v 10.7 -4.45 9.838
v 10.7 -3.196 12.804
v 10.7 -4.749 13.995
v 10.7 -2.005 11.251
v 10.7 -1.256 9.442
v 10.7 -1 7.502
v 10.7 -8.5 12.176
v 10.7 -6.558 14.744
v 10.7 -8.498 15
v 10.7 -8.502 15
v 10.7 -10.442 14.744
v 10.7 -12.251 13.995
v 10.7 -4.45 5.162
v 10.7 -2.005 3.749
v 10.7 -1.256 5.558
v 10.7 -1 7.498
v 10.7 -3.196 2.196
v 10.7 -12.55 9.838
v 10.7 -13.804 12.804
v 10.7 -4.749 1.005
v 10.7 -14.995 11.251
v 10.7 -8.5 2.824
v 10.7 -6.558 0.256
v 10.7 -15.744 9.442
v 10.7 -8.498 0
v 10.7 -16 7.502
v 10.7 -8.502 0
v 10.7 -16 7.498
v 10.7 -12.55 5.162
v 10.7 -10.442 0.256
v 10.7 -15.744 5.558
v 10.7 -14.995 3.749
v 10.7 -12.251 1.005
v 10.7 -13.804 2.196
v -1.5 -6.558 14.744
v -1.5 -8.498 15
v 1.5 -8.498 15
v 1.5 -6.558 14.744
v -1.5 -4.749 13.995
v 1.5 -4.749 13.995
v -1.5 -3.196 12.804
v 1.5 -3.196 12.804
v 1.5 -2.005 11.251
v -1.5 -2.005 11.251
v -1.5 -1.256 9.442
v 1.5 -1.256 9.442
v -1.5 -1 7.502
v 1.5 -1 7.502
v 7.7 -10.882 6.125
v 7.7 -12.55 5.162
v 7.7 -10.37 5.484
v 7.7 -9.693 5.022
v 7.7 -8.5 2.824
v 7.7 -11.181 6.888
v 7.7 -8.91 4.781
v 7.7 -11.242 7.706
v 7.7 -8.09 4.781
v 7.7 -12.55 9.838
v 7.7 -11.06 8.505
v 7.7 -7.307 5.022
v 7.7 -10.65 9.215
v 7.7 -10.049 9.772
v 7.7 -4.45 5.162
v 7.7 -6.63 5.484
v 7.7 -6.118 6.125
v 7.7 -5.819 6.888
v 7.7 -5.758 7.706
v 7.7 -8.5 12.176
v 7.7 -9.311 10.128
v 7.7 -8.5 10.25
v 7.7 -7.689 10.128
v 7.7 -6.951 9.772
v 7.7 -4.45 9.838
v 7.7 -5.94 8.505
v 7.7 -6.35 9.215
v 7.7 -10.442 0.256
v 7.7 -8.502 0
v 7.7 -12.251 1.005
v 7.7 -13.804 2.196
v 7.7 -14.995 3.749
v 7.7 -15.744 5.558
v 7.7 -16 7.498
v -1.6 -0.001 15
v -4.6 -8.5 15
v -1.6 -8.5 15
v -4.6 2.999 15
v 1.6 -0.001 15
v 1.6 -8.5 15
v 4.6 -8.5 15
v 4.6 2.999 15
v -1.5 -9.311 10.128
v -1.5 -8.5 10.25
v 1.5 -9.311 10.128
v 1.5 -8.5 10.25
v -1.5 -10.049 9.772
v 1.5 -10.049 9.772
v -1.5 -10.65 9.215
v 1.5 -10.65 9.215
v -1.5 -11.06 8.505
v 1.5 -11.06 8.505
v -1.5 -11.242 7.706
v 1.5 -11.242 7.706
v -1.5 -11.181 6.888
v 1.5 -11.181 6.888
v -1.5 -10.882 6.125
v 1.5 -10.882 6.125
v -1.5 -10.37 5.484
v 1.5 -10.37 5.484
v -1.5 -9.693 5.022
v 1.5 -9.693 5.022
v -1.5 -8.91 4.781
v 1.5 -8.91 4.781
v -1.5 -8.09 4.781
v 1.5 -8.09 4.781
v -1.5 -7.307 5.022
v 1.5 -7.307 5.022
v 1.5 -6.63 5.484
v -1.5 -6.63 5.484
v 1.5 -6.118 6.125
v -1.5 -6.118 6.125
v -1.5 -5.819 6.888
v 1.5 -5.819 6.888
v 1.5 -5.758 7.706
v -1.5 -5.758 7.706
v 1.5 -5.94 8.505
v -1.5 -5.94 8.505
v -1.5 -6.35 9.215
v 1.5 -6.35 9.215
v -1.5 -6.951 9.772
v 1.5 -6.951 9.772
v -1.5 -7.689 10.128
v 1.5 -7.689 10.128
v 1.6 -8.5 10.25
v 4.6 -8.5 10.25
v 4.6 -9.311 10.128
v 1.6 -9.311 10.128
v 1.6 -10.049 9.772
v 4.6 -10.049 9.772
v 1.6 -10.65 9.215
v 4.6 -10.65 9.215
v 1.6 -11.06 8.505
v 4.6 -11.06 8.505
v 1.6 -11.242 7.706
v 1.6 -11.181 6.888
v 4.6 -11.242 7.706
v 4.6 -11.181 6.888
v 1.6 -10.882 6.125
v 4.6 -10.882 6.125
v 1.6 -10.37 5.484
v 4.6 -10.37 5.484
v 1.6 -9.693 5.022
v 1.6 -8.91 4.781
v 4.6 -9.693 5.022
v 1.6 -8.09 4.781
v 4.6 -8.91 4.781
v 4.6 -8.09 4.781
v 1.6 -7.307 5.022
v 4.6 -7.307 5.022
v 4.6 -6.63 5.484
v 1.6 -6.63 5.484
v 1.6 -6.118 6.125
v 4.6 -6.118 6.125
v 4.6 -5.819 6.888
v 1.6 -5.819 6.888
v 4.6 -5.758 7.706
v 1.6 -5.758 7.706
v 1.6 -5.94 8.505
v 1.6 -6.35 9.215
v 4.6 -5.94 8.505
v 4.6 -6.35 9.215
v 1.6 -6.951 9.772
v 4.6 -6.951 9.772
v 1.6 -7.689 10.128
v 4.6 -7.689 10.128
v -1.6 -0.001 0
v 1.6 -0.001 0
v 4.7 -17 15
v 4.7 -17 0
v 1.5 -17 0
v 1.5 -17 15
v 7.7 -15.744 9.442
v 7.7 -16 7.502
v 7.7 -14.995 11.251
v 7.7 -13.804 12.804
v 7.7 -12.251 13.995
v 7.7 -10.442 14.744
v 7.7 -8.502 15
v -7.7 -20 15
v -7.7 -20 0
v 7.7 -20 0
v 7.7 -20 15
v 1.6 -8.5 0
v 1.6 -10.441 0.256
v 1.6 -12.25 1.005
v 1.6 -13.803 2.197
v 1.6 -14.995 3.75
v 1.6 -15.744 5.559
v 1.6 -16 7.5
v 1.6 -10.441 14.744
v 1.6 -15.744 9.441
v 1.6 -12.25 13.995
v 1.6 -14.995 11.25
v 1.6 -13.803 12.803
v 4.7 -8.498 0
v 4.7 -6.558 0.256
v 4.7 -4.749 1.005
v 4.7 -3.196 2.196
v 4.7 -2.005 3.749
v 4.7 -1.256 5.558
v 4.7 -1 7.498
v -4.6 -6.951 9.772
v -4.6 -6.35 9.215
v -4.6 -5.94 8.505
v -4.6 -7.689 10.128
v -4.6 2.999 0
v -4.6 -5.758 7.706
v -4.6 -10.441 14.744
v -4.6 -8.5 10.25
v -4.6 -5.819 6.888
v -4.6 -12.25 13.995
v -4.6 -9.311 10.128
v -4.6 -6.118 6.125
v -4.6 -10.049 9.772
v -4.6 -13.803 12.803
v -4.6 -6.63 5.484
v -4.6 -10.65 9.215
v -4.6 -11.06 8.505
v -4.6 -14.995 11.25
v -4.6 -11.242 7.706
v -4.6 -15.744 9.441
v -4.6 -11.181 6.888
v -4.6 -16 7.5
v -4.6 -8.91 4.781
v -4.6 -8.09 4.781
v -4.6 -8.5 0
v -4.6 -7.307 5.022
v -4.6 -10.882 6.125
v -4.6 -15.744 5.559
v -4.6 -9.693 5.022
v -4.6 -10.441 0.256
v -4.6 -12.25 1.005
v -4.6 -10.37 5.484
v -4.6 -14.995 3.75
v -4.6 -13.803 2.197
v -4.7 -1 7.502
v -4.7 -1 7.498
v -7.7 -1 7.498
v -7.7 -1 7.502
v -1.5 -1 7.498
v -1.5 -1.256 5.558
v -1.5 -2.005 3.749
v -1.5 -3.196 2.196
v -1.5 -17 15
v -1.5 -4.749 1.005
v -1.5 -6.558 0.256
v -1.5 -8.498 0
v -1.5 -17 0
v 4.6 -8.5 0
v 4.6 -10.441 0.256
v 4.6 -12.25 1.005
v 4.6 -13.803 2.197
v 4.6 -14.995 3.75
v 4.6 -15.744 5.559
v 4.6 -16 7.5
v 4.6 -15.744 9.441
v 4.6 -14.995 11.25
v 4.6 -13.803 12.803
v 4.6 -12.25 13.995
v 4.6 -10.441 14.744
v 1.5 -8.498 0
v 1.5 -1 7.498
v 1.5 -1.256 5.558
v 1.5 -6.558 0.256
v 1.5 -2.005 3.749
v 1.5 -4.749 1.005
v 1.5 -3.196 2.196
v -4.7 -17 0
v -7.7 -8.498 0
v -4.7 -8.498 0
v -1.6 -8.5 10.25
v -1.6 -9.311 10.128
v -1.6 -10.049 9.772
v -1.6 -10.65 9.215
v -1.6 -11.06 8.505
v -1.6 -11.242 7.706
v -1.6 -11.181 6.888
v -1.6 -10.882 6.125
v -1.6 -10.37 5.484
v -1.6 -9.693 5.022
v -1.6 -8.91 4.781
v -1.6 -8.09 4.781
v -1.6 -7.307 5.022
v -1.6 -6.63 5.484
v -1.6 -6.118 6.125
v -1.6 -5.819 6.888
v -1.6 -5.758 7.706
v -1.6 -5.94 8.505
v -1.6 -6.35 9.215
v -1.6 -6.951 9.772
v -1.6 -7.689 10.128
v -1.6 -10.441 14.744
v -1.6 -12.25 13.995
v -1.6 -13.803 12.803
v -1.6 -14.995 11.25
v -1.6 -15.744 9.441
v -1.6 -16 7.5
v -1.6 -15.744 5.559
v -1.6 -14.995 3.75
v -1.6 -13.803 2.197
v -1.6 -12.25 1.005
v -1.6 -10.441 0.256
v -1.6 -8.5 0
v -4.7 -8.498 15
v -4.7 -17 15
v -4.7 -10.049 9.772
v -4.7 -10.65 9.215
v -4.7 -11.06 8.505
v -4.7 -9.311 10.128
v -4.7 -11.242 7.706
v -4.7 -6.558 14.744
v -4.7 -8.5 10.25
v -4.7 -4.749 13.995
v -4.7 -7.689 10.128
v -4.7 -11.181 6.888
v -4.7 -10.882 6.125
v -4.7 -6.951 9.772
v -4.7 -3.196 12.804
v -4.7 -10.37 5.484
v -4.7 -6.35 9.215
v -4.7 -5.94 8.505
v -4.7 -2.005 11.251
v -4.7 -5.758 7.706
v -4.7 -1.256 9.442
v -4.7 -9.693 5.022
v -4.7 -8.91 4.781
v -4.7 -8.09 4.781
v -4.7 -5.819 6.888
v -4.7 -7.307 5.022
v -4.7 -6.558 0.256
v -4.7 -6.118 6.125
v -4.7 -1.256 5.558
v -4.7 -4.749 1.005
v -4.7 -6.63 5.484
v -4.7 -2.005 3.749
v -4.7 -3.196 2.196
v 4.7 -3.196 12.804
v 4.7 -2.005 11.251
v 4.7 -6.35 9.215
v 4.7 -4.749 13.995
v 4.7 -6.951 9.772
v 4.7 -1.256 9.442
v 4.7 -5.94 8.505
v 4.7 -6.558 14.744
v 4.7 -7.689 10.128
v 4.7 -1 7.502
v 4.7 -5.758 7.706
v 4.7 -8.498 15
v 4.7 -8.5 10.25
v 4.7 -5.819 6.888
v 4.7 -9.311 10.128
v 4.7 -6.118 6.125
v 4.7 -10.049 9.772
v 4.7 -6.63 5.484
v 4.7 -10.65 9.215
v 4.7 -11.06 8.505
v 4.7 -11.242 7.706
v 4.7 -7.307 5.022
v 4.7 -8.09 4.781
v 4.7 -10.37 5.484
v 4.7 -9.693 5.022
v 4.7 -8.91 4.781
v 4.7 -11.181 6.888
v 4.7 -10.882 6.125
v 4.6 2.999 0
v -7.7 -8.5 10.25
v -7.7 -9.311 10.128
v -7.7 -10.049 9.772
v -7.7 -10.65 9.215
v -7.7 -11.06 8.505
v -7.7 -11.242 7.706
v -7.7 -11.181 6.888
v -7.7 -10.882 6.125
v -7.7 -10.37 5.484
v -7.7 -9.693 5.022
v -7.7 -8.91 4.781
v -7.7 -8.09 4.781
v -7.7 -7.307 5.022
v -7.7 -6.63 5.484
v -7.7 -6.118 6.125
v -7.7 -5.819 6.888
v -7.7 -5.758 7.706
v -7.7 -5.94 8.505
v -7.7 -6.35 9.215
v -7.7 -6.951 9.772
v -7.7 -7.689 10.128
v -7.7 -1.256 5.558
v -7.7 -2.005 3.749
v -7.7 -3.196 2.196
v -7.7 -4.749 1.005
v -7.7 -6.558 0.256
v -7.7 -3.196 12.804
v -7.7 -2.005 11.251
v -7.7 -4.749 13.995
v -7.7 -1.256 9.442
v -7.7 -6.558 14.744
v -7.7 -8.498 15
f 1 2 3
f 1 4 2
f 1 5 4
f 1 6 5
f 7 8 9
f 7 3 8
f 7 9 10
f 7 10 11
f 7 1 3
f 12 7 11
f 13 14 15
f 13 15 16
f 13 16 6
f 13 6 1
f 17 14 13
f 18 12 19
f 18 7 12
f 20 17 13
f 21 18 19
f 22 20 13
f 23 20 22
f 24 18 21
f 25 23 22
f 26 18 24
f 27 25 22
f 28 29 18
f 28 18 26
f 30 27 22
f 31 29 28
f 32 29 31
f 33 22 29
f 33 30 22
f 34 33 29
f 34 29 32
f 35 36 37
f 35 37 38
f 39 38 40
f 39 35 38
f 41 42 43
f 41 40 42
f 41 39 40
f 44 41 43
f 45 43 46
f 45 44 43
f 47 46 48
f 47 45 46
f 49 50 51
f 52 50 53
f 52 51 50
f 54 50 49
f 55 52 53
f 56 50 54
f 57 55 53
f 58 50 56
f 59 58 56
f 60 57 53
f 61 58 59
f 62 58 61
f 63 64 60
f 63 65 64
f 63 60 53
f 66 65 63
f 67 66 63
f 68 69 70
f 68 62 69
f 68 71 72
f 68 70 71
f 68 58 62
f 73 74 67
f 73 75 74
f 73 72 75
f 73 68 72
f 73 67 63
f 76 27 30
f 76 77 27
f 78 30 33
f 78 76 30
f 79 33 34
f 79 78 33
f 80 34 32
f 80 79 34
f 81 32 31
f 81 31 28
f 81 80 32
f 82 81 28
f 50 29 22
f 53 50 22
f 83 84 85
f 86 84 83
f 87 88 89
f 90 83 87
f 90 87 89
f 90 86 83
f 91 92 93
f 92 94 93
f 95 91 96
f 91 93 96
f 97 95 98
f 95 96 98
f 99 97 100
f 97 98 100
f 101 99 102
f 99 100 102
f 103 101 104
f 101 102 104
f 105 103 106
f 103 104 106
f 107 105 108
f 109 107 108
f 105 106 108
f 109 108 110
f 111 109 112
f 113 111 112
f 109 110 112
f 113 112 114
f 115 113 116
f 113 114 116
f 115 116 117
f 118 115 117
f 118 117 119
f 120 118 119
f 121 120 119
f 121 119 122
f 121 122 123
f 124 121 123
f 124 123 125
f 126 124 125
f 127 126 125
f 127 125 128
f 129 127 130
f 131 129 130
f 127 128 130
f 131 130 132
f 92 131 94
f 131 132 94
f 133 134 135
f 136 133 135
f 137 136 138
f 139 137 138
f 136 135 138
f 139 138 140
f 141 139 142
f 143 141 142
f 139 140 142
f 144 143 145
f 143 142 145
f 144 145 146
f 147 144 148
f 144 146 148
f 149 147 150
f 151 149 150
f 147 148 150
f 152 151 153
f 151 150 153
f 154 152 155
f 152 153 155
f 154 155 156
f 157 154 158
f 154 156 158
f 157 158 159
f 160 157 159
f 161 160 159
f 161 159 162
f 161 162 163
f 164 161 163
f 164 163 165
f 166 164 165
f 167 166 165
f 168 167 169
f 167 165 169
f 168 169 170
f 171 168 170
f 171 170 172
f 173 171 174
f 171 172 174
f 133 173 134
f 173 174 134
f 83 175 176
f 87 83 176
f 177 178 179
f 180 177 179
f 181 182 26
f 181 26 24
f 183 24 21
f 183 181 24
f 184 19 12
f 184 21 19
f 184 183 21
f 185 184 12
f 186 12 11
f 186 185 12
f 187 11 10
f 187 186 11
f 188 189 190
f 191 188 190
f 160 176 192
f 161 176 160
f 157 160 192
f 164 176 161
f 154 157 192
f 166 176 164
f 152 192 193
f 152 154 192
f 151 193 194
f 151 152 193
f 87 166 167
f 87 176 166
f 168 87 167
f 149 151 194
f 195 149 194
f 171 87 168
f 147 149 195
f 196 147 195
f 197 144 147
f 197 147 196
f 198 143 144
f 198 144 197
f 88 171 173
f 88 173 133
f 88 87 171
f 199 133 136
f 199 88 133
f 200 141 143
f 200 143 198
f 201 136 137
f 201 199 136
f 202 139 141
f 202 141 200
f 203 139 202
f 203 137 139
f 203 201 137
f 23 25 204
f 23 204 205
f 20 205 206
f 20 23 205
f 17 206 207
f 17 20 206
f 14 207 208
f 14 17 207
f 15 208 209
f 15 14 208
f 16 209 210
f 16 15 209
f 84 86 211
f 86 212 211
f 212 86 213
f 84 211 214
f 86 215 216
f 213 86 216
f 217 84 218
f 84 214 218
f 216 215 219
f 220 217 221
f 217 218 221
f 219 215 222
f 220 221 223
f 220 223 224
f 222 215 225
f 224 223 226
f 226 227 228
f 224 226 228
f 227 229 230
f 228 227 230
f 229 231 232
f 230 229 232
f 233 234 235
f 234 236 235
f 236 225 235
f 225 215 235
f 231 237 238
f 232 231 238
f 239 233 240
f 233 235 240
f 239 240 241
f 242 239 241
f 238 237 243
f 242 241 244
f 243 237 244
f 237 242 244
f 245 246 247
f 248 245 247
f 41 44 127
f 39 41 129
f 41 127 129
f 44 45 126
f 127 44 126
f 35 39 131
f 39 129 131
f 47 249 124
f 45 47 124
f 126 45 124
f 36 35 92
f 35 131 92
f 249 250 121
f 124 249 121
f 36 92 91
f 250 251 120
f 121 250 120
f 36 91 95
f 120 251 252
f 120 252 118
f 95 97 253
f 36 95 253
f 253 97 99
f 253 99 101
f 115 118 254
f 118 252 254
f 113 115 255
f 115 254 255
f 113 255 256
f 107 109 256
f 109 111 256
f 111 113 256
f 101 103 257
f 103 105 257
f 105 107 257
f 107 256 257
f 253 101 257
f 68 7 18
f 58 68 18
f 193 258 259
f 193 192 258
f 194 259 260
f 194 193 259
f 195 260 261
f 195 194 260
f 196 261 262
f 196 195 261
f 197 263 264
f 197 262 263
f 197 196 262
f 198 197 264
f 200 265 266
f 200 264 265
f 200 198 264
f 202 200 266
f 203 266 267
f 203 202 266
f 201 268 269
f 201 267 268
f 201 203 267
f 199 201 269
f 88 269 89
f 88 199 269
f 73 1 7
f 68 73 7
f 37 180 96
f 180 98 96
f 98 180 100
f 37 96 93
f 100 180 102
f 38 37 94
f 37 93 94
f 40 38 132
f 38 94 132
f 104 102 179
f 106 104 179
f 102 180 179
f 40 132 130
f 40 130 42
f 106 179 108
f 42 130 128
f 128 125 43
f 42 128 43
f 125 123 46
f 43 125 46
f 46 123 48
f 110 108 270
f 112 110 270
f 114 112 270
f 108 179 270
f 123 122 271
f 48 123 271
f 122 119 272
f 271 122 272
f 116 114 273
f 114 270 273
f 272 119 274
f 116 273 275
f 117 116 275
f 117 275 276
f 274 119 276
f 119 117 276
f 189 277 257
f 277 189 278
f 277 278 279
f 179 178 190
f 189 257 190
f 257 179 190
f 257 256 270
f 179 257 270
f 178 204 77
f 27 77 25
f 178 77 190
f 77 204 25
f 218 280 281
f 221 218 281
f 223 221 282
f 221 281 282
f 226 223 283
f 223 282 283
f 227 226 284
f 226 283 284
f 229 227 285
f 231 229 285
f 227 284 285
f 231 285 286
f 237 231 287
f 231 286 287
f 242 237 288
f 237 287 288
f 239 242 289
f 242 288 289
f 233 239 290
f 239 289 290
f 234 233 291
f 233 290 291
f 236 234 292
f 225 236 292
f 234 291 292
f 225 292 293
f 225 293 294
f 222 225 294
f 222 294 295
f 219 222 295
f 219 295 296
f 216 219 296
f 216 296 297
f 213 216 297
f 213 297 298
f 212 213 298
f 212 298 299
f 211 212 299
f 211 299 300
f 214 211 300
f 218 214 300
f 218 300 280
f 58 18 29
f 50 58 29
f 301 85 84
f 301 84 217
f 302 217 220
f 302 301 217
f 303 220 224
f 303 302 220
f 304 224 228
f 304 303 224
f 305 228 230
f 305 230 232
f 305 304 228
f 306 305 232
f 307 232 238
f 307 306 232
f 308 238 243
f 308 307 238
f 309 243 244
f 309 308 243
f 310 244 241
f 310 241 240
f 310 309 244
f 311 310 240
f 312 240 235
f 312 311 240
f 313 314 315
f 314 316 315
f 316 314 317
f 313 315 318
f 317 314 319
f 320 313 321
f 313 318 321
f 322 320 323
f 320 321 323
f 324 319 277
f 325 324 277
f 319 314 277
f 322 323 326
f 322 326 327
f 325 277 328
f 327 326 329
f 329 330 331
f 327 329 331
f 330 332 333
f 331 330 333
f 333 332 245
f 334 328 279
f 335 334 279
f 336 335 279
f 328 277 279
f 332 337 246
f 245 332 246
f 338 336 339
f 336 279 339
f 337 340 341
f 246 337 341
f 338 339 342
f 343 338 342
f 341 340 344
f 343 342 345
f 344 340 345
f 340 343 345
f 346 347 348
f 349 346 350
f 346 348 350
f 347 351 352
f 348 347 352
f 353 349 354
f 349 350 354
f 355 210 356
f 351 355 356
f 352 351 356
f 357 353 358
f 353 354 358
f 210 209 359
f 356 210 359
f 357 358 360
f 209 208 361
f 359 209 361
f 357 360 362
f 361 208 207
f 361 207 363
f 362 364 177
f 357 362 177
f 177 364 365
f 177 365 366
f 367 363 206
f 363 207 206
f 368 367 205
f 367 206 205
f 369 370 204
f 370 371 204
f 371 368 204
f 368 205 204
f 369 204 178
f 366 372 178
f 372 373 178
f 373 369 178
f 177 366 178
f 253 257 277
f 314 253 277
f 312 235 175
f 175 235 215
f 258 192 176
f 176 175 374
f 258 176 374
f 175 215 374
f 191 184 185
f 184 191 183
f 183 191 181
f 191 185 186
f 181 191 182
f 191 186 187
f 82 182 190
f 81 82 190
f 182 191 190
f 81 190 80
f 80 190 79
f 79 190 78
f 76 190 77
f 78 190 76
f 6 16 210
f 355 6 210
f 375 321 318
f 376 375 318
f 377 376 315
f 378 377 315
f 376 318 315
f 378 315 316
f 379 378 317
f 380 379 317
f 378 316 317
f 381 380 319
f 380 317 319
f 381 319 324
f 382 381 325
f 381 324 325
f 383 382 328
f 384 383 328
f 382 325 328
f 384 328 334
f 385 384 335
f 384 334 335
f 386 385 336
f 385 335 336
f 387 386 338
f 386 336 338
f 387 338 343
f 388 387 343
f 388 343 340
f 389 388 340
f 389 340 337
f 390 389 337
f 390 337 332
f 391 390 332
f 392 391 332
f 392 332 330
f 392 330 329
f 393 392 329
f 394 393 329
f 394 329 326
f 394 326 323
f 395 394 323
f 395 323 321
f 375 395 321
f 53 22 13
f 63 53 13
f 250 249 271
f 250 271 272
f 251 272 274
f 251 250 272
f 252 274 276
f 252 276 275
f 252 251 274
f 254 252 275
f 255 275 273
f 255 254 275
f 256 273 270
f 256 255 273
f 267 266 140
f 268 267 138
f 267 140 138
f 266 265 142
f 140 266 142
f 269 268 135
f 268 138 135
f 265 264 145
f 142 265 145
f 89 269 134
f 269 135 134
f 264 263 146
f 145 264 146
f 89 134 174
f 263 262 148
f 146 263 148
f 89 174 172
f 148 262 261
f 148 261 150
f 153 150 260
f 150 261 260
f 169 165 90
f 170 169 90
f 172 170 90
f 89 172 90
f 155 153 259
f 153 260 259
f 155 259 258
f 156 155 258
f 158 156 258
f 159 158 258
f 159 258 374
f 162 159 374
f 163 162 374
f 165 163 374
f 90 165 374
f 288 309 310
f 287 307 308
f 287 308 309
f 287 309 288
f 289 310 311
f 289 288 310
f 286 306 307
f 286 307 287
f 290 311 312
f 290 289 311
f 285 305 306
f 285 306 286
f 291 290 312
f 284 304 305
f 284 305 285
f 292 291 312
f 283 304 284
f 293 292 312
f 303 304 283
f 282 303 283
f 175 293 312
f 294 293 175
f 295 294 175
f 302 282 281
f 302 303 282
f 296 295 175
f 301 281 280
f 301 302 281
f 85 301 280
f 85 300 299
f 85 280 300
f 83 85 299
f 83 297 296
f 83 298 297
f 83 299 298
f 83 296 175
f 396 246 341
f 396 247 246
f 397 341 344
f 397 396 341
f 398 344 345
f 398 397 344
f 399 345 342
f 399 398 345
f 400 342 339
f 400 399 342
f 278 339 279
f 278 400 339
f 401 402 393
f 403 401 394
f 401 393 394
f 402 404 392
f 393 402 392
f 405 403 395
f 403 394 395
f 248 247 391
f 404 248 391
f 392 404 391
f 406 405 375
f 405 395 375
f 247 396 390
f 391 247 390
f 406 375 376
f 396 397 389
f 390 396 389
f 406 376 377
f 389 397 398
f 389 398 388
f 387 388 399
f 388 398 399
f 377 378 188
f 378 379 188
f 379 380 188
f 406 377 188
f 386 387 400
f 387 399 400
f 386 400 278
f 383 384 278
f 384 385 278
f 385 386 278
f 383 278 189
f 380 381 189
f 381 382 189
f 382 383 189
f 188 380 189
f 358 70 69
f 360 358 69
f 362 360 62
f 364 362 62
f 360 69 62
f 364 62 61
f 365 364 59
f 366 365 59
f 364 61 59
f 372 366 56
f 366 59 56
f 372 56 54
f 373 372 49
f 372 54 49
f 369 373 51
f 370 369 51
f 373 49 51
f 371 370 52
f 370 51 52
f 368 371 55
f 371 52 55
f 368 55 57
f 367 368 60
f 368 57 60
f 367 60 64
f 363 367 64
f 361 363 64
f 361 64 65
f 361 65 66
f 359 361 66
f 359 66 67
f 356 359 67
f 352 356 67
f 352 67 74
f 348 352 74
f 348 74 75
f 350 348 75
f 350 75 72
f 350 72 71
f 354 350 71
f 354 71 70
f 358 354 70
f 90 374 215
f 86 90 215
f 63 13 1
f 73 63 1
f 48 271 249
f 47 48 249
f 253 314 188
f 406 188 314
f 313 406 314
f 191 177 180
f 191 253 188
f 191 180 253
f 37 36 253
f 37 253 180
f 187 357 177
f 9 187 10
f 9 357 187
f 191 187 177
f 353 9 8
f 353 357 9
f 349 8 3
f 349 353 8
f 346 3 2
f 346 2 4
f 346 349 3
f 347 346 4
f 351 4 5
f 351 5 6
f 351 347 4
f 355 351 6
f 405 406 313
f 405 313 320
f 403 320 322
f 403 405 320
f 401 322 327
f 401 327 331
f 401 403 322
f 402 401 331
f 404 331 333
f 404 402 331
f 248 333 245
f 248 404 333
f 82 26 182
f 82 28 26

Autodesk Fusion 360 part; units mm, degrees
ref_plane "WorkPlane1" through (-1.6, 0, 0) normal (1, 0, 0) x (0, 1, 0) in component "Gopro Profile Male"
sketch "Sketch25" plane through (-1.6, 0, 0) normal (1, 0, 0) x (0, 1, 0) in component "Gopro Profile Male"
  circle A0 centre (-8.5, 7.5) radius 7.5
  line L0 (0, 0) -> (-8.5, 0)
  line L1 (-0.0009, 15) -> (-8.5, 15)
  line L2 (-0.0009, 15) -> (0, 15)
  line L3 (0, 15) -> (0, 0)
  dimension "d499" = 15
  dimension "d631" = 8.5
extrude "Extrude16" add sketch "Sketch25" against normal blind 3 makes body 1 in component "Gopro Profile Male"
mirror "Mirror1" about plane through (0, 0, 0) normal (1, 0, 0) of "Extrude16" makes body 2 in component "Gopro Profile Male"
sketch "Sketch26" plane through (0, 0, 0) normal (0, 0, 1) x (1, 0, 0) in component "Gopro Profile Male"
  line L0 (-4.6, -0.0009) -> (4.6, -0.0009)
  line L1 (4.6, -0.0009) -> (4.6, 2.9991)
  line L2 (4.6, 2.9991) -> (-4.6, 2.9991)
  line L3 (-4.6, 2.9991) -> (-4.6, -0.0009)
  line L4 (4.6, -8.5) -> (4.6, -0.0009)
  point P0 (-4.6, -0.0009)
  dimension "d632" = 3
extrude "Extrude17" add sketch "Sketch26" along normal blind 15 bodies 1 2 in component "Gopro Profile Male"
hole "Hole4" at (-4.6, -8.5, 7.5) direction (1, 0, 0) diameter 5.5 depth 10 tip angle 118 bodies 1 in component "Gopro Profile Male"
sketch "Sketch1" plane through (0, 0, 0) normal (0, 0, 1) x (1, 0, 0) in component "Gopro Profile Female"
  line L0 (-1.6, -0.0009) -> (-1.6, -8.5)
  line L1 (-1.5, -1) -> (-1.5, -17)
  line L2 (-1.5, -17) -> (-4.7, -17)
  line L3 (-4.7, -17) -> (-4.7, -1)
  line L4 (-4.7, -1) -> (-7.7, -1)
  line L5 (-7.7, -1) -> (-7.7, -20)
  line L6 (-7.7, -20) -> (7.7, -20)
  line L7 (7.7, -20) -> (7.7, -1)
  line L8 (7.7, -1) -> (4.7, -1)
  line L9 (4.7, -1) -> (4.7, -17)
  line L10 (4.7, -17) -> (1.5, -17)
  line L11 (1.5, -17) -> (1.5, -1)
  line L12 (1.5, -1) -> (-1.5, -1)
  line L13 (7.7, -1) -> (10.7, -1)
  line L14 (10.7, -1) -> (10.7, -16)
  line L15 (10.7, -16) -> (4.7, -16)
  dimension "d509" = 3
  dimension "d510" = 1.5
  dimension "d511" = 3.2
  dimension "d512" = 17
  dimension "d513" = 16
  dimension "d514" = 3
  dimension "d525" = 15
  dimension "d526" = 3
  dimension "d615" = 3
extrude "Extrude1" add sketch "Sketch1" along normal blind 15 separate body makes body 3 in component "Gopro Profile Female"
fillet "Fillet1" radius 7.5 8 edges at (-6.2, -1, 0) (7.7, -1, 0) (0, -1, 0) (-6.2, -1, 15) (0, -1, 15) (7.7, -1, 15) (9.2, -16, 15) (9.2, -16, 0) on bodies 3 in component "Gopro Profile Female"
hole "Hole1" at (-7.7, -8.5, 7.5) direction (1, 0, 0) diameter 5.5 depth 20 tip angle 118 bodies 3 in component "Gopro Profile Female"
sketch "Sketch4" plane through (10.7, 0, 0) normal (1, 0, 0) x (0, 1, 0) in component "Gopro Profile Female"
  circle A0 centre (-8.5, 7.5) radius 7.5
  line L0 (-4.45, 9.8383) -> (-8.5, 12.1765)
  line L1 (-8.5, 12.1765) -> (-12.55, 9.8383)
  line L2 (-12.55, 9.8383) -> (-12.55, 5.1617)
  line L3 (-12.55, 5.1617) -> (-8.5, 2.8235)
  line L4 (-8.5, 2.8235) -> (-4.45, 5.1617)
  line L5 (-4.45, 5.1617) -> (-4.45, 9.8383)
  circle A1 centre (-8.5, 7.5) radius 2.75
  point P0 (-8.5, 7.5)
  dimension "d527" = 8.1
extrude "Extrude3" cut sketch "Sketch4" against normal blind 3 contours L0 L1 L2 L3 L4 L5 | A1 bodies 3 in component "Gopro Profile Female"
sketch "Sketch6" plane through (0, 0, 15) normal (0, 0, 1) x (-1, 0, 0) in component "Gopro Profile Female"
  line L0 (-7.7, 8.5) -> (-4.7, 8.5)
  line L1 (-4.7, 8.5) -> (-4.7, 17)
  line L2 (-4.7, 17) -> (-1.5, 17)
  line L3 (-1.5, 17) -> (-1.5, 8.5)
  line L4 (-1.5, 8.5) -> (1.5, 8.5)
  line L5 (1.5, 8.5) -> (1.5, 17)
  line L6 (1.5, 17) -> (4.7, 17)
  line L7 (4.7, 17) -> (4.7, 8.5)
  line L8 (4.7, 8.5) -> (7.7, 8.5)
  line L9 (0, 20.4687) -> (5.6563, 23.7344)
  line L10 (5.6562, 23.7344) -> (5.6563, 30.2656)
  line L11 (5.6563, 30.2656) -> (0, 33.5313)
  line L12 (0, 33.5313) -> (-5.6562, 30.2656)
  line L13 (-5.6562, 30.2656) -> (-5.6563, 23.7344)
  line L14 (-5.6563, 23.7344) -> (0, 20.4687)
  line L15 (-7.7, 20) -> (-7.7, 8.5)
  line L16 (7.7, 8.5) -> (7.7, 20)
  line L17 (7.7, 20) -> (-7.7, 20)
  point P0 (0, 27)
  point P1 (0, 27)
  dimension "d534" = 11.3125
hole "Hole2" at (0, -27, 15) direction (0, 0, -1) diameter 7.142 depth 20 tip angle 118 bodies 3 in component "Gopro Profile Female"
component "Gopro Profile Male" placed x (1, 0, 0) y (0, 1, 0) z (0, 0, 1) at (0, 0, 0)
component "Gopro Profile Female" placed x (1, 0, 0) y (0, 1, 0) z (0, 0, 1) at (0, 0, 0)
equation "d534 = 0.4375 in + 0.2 mm"
